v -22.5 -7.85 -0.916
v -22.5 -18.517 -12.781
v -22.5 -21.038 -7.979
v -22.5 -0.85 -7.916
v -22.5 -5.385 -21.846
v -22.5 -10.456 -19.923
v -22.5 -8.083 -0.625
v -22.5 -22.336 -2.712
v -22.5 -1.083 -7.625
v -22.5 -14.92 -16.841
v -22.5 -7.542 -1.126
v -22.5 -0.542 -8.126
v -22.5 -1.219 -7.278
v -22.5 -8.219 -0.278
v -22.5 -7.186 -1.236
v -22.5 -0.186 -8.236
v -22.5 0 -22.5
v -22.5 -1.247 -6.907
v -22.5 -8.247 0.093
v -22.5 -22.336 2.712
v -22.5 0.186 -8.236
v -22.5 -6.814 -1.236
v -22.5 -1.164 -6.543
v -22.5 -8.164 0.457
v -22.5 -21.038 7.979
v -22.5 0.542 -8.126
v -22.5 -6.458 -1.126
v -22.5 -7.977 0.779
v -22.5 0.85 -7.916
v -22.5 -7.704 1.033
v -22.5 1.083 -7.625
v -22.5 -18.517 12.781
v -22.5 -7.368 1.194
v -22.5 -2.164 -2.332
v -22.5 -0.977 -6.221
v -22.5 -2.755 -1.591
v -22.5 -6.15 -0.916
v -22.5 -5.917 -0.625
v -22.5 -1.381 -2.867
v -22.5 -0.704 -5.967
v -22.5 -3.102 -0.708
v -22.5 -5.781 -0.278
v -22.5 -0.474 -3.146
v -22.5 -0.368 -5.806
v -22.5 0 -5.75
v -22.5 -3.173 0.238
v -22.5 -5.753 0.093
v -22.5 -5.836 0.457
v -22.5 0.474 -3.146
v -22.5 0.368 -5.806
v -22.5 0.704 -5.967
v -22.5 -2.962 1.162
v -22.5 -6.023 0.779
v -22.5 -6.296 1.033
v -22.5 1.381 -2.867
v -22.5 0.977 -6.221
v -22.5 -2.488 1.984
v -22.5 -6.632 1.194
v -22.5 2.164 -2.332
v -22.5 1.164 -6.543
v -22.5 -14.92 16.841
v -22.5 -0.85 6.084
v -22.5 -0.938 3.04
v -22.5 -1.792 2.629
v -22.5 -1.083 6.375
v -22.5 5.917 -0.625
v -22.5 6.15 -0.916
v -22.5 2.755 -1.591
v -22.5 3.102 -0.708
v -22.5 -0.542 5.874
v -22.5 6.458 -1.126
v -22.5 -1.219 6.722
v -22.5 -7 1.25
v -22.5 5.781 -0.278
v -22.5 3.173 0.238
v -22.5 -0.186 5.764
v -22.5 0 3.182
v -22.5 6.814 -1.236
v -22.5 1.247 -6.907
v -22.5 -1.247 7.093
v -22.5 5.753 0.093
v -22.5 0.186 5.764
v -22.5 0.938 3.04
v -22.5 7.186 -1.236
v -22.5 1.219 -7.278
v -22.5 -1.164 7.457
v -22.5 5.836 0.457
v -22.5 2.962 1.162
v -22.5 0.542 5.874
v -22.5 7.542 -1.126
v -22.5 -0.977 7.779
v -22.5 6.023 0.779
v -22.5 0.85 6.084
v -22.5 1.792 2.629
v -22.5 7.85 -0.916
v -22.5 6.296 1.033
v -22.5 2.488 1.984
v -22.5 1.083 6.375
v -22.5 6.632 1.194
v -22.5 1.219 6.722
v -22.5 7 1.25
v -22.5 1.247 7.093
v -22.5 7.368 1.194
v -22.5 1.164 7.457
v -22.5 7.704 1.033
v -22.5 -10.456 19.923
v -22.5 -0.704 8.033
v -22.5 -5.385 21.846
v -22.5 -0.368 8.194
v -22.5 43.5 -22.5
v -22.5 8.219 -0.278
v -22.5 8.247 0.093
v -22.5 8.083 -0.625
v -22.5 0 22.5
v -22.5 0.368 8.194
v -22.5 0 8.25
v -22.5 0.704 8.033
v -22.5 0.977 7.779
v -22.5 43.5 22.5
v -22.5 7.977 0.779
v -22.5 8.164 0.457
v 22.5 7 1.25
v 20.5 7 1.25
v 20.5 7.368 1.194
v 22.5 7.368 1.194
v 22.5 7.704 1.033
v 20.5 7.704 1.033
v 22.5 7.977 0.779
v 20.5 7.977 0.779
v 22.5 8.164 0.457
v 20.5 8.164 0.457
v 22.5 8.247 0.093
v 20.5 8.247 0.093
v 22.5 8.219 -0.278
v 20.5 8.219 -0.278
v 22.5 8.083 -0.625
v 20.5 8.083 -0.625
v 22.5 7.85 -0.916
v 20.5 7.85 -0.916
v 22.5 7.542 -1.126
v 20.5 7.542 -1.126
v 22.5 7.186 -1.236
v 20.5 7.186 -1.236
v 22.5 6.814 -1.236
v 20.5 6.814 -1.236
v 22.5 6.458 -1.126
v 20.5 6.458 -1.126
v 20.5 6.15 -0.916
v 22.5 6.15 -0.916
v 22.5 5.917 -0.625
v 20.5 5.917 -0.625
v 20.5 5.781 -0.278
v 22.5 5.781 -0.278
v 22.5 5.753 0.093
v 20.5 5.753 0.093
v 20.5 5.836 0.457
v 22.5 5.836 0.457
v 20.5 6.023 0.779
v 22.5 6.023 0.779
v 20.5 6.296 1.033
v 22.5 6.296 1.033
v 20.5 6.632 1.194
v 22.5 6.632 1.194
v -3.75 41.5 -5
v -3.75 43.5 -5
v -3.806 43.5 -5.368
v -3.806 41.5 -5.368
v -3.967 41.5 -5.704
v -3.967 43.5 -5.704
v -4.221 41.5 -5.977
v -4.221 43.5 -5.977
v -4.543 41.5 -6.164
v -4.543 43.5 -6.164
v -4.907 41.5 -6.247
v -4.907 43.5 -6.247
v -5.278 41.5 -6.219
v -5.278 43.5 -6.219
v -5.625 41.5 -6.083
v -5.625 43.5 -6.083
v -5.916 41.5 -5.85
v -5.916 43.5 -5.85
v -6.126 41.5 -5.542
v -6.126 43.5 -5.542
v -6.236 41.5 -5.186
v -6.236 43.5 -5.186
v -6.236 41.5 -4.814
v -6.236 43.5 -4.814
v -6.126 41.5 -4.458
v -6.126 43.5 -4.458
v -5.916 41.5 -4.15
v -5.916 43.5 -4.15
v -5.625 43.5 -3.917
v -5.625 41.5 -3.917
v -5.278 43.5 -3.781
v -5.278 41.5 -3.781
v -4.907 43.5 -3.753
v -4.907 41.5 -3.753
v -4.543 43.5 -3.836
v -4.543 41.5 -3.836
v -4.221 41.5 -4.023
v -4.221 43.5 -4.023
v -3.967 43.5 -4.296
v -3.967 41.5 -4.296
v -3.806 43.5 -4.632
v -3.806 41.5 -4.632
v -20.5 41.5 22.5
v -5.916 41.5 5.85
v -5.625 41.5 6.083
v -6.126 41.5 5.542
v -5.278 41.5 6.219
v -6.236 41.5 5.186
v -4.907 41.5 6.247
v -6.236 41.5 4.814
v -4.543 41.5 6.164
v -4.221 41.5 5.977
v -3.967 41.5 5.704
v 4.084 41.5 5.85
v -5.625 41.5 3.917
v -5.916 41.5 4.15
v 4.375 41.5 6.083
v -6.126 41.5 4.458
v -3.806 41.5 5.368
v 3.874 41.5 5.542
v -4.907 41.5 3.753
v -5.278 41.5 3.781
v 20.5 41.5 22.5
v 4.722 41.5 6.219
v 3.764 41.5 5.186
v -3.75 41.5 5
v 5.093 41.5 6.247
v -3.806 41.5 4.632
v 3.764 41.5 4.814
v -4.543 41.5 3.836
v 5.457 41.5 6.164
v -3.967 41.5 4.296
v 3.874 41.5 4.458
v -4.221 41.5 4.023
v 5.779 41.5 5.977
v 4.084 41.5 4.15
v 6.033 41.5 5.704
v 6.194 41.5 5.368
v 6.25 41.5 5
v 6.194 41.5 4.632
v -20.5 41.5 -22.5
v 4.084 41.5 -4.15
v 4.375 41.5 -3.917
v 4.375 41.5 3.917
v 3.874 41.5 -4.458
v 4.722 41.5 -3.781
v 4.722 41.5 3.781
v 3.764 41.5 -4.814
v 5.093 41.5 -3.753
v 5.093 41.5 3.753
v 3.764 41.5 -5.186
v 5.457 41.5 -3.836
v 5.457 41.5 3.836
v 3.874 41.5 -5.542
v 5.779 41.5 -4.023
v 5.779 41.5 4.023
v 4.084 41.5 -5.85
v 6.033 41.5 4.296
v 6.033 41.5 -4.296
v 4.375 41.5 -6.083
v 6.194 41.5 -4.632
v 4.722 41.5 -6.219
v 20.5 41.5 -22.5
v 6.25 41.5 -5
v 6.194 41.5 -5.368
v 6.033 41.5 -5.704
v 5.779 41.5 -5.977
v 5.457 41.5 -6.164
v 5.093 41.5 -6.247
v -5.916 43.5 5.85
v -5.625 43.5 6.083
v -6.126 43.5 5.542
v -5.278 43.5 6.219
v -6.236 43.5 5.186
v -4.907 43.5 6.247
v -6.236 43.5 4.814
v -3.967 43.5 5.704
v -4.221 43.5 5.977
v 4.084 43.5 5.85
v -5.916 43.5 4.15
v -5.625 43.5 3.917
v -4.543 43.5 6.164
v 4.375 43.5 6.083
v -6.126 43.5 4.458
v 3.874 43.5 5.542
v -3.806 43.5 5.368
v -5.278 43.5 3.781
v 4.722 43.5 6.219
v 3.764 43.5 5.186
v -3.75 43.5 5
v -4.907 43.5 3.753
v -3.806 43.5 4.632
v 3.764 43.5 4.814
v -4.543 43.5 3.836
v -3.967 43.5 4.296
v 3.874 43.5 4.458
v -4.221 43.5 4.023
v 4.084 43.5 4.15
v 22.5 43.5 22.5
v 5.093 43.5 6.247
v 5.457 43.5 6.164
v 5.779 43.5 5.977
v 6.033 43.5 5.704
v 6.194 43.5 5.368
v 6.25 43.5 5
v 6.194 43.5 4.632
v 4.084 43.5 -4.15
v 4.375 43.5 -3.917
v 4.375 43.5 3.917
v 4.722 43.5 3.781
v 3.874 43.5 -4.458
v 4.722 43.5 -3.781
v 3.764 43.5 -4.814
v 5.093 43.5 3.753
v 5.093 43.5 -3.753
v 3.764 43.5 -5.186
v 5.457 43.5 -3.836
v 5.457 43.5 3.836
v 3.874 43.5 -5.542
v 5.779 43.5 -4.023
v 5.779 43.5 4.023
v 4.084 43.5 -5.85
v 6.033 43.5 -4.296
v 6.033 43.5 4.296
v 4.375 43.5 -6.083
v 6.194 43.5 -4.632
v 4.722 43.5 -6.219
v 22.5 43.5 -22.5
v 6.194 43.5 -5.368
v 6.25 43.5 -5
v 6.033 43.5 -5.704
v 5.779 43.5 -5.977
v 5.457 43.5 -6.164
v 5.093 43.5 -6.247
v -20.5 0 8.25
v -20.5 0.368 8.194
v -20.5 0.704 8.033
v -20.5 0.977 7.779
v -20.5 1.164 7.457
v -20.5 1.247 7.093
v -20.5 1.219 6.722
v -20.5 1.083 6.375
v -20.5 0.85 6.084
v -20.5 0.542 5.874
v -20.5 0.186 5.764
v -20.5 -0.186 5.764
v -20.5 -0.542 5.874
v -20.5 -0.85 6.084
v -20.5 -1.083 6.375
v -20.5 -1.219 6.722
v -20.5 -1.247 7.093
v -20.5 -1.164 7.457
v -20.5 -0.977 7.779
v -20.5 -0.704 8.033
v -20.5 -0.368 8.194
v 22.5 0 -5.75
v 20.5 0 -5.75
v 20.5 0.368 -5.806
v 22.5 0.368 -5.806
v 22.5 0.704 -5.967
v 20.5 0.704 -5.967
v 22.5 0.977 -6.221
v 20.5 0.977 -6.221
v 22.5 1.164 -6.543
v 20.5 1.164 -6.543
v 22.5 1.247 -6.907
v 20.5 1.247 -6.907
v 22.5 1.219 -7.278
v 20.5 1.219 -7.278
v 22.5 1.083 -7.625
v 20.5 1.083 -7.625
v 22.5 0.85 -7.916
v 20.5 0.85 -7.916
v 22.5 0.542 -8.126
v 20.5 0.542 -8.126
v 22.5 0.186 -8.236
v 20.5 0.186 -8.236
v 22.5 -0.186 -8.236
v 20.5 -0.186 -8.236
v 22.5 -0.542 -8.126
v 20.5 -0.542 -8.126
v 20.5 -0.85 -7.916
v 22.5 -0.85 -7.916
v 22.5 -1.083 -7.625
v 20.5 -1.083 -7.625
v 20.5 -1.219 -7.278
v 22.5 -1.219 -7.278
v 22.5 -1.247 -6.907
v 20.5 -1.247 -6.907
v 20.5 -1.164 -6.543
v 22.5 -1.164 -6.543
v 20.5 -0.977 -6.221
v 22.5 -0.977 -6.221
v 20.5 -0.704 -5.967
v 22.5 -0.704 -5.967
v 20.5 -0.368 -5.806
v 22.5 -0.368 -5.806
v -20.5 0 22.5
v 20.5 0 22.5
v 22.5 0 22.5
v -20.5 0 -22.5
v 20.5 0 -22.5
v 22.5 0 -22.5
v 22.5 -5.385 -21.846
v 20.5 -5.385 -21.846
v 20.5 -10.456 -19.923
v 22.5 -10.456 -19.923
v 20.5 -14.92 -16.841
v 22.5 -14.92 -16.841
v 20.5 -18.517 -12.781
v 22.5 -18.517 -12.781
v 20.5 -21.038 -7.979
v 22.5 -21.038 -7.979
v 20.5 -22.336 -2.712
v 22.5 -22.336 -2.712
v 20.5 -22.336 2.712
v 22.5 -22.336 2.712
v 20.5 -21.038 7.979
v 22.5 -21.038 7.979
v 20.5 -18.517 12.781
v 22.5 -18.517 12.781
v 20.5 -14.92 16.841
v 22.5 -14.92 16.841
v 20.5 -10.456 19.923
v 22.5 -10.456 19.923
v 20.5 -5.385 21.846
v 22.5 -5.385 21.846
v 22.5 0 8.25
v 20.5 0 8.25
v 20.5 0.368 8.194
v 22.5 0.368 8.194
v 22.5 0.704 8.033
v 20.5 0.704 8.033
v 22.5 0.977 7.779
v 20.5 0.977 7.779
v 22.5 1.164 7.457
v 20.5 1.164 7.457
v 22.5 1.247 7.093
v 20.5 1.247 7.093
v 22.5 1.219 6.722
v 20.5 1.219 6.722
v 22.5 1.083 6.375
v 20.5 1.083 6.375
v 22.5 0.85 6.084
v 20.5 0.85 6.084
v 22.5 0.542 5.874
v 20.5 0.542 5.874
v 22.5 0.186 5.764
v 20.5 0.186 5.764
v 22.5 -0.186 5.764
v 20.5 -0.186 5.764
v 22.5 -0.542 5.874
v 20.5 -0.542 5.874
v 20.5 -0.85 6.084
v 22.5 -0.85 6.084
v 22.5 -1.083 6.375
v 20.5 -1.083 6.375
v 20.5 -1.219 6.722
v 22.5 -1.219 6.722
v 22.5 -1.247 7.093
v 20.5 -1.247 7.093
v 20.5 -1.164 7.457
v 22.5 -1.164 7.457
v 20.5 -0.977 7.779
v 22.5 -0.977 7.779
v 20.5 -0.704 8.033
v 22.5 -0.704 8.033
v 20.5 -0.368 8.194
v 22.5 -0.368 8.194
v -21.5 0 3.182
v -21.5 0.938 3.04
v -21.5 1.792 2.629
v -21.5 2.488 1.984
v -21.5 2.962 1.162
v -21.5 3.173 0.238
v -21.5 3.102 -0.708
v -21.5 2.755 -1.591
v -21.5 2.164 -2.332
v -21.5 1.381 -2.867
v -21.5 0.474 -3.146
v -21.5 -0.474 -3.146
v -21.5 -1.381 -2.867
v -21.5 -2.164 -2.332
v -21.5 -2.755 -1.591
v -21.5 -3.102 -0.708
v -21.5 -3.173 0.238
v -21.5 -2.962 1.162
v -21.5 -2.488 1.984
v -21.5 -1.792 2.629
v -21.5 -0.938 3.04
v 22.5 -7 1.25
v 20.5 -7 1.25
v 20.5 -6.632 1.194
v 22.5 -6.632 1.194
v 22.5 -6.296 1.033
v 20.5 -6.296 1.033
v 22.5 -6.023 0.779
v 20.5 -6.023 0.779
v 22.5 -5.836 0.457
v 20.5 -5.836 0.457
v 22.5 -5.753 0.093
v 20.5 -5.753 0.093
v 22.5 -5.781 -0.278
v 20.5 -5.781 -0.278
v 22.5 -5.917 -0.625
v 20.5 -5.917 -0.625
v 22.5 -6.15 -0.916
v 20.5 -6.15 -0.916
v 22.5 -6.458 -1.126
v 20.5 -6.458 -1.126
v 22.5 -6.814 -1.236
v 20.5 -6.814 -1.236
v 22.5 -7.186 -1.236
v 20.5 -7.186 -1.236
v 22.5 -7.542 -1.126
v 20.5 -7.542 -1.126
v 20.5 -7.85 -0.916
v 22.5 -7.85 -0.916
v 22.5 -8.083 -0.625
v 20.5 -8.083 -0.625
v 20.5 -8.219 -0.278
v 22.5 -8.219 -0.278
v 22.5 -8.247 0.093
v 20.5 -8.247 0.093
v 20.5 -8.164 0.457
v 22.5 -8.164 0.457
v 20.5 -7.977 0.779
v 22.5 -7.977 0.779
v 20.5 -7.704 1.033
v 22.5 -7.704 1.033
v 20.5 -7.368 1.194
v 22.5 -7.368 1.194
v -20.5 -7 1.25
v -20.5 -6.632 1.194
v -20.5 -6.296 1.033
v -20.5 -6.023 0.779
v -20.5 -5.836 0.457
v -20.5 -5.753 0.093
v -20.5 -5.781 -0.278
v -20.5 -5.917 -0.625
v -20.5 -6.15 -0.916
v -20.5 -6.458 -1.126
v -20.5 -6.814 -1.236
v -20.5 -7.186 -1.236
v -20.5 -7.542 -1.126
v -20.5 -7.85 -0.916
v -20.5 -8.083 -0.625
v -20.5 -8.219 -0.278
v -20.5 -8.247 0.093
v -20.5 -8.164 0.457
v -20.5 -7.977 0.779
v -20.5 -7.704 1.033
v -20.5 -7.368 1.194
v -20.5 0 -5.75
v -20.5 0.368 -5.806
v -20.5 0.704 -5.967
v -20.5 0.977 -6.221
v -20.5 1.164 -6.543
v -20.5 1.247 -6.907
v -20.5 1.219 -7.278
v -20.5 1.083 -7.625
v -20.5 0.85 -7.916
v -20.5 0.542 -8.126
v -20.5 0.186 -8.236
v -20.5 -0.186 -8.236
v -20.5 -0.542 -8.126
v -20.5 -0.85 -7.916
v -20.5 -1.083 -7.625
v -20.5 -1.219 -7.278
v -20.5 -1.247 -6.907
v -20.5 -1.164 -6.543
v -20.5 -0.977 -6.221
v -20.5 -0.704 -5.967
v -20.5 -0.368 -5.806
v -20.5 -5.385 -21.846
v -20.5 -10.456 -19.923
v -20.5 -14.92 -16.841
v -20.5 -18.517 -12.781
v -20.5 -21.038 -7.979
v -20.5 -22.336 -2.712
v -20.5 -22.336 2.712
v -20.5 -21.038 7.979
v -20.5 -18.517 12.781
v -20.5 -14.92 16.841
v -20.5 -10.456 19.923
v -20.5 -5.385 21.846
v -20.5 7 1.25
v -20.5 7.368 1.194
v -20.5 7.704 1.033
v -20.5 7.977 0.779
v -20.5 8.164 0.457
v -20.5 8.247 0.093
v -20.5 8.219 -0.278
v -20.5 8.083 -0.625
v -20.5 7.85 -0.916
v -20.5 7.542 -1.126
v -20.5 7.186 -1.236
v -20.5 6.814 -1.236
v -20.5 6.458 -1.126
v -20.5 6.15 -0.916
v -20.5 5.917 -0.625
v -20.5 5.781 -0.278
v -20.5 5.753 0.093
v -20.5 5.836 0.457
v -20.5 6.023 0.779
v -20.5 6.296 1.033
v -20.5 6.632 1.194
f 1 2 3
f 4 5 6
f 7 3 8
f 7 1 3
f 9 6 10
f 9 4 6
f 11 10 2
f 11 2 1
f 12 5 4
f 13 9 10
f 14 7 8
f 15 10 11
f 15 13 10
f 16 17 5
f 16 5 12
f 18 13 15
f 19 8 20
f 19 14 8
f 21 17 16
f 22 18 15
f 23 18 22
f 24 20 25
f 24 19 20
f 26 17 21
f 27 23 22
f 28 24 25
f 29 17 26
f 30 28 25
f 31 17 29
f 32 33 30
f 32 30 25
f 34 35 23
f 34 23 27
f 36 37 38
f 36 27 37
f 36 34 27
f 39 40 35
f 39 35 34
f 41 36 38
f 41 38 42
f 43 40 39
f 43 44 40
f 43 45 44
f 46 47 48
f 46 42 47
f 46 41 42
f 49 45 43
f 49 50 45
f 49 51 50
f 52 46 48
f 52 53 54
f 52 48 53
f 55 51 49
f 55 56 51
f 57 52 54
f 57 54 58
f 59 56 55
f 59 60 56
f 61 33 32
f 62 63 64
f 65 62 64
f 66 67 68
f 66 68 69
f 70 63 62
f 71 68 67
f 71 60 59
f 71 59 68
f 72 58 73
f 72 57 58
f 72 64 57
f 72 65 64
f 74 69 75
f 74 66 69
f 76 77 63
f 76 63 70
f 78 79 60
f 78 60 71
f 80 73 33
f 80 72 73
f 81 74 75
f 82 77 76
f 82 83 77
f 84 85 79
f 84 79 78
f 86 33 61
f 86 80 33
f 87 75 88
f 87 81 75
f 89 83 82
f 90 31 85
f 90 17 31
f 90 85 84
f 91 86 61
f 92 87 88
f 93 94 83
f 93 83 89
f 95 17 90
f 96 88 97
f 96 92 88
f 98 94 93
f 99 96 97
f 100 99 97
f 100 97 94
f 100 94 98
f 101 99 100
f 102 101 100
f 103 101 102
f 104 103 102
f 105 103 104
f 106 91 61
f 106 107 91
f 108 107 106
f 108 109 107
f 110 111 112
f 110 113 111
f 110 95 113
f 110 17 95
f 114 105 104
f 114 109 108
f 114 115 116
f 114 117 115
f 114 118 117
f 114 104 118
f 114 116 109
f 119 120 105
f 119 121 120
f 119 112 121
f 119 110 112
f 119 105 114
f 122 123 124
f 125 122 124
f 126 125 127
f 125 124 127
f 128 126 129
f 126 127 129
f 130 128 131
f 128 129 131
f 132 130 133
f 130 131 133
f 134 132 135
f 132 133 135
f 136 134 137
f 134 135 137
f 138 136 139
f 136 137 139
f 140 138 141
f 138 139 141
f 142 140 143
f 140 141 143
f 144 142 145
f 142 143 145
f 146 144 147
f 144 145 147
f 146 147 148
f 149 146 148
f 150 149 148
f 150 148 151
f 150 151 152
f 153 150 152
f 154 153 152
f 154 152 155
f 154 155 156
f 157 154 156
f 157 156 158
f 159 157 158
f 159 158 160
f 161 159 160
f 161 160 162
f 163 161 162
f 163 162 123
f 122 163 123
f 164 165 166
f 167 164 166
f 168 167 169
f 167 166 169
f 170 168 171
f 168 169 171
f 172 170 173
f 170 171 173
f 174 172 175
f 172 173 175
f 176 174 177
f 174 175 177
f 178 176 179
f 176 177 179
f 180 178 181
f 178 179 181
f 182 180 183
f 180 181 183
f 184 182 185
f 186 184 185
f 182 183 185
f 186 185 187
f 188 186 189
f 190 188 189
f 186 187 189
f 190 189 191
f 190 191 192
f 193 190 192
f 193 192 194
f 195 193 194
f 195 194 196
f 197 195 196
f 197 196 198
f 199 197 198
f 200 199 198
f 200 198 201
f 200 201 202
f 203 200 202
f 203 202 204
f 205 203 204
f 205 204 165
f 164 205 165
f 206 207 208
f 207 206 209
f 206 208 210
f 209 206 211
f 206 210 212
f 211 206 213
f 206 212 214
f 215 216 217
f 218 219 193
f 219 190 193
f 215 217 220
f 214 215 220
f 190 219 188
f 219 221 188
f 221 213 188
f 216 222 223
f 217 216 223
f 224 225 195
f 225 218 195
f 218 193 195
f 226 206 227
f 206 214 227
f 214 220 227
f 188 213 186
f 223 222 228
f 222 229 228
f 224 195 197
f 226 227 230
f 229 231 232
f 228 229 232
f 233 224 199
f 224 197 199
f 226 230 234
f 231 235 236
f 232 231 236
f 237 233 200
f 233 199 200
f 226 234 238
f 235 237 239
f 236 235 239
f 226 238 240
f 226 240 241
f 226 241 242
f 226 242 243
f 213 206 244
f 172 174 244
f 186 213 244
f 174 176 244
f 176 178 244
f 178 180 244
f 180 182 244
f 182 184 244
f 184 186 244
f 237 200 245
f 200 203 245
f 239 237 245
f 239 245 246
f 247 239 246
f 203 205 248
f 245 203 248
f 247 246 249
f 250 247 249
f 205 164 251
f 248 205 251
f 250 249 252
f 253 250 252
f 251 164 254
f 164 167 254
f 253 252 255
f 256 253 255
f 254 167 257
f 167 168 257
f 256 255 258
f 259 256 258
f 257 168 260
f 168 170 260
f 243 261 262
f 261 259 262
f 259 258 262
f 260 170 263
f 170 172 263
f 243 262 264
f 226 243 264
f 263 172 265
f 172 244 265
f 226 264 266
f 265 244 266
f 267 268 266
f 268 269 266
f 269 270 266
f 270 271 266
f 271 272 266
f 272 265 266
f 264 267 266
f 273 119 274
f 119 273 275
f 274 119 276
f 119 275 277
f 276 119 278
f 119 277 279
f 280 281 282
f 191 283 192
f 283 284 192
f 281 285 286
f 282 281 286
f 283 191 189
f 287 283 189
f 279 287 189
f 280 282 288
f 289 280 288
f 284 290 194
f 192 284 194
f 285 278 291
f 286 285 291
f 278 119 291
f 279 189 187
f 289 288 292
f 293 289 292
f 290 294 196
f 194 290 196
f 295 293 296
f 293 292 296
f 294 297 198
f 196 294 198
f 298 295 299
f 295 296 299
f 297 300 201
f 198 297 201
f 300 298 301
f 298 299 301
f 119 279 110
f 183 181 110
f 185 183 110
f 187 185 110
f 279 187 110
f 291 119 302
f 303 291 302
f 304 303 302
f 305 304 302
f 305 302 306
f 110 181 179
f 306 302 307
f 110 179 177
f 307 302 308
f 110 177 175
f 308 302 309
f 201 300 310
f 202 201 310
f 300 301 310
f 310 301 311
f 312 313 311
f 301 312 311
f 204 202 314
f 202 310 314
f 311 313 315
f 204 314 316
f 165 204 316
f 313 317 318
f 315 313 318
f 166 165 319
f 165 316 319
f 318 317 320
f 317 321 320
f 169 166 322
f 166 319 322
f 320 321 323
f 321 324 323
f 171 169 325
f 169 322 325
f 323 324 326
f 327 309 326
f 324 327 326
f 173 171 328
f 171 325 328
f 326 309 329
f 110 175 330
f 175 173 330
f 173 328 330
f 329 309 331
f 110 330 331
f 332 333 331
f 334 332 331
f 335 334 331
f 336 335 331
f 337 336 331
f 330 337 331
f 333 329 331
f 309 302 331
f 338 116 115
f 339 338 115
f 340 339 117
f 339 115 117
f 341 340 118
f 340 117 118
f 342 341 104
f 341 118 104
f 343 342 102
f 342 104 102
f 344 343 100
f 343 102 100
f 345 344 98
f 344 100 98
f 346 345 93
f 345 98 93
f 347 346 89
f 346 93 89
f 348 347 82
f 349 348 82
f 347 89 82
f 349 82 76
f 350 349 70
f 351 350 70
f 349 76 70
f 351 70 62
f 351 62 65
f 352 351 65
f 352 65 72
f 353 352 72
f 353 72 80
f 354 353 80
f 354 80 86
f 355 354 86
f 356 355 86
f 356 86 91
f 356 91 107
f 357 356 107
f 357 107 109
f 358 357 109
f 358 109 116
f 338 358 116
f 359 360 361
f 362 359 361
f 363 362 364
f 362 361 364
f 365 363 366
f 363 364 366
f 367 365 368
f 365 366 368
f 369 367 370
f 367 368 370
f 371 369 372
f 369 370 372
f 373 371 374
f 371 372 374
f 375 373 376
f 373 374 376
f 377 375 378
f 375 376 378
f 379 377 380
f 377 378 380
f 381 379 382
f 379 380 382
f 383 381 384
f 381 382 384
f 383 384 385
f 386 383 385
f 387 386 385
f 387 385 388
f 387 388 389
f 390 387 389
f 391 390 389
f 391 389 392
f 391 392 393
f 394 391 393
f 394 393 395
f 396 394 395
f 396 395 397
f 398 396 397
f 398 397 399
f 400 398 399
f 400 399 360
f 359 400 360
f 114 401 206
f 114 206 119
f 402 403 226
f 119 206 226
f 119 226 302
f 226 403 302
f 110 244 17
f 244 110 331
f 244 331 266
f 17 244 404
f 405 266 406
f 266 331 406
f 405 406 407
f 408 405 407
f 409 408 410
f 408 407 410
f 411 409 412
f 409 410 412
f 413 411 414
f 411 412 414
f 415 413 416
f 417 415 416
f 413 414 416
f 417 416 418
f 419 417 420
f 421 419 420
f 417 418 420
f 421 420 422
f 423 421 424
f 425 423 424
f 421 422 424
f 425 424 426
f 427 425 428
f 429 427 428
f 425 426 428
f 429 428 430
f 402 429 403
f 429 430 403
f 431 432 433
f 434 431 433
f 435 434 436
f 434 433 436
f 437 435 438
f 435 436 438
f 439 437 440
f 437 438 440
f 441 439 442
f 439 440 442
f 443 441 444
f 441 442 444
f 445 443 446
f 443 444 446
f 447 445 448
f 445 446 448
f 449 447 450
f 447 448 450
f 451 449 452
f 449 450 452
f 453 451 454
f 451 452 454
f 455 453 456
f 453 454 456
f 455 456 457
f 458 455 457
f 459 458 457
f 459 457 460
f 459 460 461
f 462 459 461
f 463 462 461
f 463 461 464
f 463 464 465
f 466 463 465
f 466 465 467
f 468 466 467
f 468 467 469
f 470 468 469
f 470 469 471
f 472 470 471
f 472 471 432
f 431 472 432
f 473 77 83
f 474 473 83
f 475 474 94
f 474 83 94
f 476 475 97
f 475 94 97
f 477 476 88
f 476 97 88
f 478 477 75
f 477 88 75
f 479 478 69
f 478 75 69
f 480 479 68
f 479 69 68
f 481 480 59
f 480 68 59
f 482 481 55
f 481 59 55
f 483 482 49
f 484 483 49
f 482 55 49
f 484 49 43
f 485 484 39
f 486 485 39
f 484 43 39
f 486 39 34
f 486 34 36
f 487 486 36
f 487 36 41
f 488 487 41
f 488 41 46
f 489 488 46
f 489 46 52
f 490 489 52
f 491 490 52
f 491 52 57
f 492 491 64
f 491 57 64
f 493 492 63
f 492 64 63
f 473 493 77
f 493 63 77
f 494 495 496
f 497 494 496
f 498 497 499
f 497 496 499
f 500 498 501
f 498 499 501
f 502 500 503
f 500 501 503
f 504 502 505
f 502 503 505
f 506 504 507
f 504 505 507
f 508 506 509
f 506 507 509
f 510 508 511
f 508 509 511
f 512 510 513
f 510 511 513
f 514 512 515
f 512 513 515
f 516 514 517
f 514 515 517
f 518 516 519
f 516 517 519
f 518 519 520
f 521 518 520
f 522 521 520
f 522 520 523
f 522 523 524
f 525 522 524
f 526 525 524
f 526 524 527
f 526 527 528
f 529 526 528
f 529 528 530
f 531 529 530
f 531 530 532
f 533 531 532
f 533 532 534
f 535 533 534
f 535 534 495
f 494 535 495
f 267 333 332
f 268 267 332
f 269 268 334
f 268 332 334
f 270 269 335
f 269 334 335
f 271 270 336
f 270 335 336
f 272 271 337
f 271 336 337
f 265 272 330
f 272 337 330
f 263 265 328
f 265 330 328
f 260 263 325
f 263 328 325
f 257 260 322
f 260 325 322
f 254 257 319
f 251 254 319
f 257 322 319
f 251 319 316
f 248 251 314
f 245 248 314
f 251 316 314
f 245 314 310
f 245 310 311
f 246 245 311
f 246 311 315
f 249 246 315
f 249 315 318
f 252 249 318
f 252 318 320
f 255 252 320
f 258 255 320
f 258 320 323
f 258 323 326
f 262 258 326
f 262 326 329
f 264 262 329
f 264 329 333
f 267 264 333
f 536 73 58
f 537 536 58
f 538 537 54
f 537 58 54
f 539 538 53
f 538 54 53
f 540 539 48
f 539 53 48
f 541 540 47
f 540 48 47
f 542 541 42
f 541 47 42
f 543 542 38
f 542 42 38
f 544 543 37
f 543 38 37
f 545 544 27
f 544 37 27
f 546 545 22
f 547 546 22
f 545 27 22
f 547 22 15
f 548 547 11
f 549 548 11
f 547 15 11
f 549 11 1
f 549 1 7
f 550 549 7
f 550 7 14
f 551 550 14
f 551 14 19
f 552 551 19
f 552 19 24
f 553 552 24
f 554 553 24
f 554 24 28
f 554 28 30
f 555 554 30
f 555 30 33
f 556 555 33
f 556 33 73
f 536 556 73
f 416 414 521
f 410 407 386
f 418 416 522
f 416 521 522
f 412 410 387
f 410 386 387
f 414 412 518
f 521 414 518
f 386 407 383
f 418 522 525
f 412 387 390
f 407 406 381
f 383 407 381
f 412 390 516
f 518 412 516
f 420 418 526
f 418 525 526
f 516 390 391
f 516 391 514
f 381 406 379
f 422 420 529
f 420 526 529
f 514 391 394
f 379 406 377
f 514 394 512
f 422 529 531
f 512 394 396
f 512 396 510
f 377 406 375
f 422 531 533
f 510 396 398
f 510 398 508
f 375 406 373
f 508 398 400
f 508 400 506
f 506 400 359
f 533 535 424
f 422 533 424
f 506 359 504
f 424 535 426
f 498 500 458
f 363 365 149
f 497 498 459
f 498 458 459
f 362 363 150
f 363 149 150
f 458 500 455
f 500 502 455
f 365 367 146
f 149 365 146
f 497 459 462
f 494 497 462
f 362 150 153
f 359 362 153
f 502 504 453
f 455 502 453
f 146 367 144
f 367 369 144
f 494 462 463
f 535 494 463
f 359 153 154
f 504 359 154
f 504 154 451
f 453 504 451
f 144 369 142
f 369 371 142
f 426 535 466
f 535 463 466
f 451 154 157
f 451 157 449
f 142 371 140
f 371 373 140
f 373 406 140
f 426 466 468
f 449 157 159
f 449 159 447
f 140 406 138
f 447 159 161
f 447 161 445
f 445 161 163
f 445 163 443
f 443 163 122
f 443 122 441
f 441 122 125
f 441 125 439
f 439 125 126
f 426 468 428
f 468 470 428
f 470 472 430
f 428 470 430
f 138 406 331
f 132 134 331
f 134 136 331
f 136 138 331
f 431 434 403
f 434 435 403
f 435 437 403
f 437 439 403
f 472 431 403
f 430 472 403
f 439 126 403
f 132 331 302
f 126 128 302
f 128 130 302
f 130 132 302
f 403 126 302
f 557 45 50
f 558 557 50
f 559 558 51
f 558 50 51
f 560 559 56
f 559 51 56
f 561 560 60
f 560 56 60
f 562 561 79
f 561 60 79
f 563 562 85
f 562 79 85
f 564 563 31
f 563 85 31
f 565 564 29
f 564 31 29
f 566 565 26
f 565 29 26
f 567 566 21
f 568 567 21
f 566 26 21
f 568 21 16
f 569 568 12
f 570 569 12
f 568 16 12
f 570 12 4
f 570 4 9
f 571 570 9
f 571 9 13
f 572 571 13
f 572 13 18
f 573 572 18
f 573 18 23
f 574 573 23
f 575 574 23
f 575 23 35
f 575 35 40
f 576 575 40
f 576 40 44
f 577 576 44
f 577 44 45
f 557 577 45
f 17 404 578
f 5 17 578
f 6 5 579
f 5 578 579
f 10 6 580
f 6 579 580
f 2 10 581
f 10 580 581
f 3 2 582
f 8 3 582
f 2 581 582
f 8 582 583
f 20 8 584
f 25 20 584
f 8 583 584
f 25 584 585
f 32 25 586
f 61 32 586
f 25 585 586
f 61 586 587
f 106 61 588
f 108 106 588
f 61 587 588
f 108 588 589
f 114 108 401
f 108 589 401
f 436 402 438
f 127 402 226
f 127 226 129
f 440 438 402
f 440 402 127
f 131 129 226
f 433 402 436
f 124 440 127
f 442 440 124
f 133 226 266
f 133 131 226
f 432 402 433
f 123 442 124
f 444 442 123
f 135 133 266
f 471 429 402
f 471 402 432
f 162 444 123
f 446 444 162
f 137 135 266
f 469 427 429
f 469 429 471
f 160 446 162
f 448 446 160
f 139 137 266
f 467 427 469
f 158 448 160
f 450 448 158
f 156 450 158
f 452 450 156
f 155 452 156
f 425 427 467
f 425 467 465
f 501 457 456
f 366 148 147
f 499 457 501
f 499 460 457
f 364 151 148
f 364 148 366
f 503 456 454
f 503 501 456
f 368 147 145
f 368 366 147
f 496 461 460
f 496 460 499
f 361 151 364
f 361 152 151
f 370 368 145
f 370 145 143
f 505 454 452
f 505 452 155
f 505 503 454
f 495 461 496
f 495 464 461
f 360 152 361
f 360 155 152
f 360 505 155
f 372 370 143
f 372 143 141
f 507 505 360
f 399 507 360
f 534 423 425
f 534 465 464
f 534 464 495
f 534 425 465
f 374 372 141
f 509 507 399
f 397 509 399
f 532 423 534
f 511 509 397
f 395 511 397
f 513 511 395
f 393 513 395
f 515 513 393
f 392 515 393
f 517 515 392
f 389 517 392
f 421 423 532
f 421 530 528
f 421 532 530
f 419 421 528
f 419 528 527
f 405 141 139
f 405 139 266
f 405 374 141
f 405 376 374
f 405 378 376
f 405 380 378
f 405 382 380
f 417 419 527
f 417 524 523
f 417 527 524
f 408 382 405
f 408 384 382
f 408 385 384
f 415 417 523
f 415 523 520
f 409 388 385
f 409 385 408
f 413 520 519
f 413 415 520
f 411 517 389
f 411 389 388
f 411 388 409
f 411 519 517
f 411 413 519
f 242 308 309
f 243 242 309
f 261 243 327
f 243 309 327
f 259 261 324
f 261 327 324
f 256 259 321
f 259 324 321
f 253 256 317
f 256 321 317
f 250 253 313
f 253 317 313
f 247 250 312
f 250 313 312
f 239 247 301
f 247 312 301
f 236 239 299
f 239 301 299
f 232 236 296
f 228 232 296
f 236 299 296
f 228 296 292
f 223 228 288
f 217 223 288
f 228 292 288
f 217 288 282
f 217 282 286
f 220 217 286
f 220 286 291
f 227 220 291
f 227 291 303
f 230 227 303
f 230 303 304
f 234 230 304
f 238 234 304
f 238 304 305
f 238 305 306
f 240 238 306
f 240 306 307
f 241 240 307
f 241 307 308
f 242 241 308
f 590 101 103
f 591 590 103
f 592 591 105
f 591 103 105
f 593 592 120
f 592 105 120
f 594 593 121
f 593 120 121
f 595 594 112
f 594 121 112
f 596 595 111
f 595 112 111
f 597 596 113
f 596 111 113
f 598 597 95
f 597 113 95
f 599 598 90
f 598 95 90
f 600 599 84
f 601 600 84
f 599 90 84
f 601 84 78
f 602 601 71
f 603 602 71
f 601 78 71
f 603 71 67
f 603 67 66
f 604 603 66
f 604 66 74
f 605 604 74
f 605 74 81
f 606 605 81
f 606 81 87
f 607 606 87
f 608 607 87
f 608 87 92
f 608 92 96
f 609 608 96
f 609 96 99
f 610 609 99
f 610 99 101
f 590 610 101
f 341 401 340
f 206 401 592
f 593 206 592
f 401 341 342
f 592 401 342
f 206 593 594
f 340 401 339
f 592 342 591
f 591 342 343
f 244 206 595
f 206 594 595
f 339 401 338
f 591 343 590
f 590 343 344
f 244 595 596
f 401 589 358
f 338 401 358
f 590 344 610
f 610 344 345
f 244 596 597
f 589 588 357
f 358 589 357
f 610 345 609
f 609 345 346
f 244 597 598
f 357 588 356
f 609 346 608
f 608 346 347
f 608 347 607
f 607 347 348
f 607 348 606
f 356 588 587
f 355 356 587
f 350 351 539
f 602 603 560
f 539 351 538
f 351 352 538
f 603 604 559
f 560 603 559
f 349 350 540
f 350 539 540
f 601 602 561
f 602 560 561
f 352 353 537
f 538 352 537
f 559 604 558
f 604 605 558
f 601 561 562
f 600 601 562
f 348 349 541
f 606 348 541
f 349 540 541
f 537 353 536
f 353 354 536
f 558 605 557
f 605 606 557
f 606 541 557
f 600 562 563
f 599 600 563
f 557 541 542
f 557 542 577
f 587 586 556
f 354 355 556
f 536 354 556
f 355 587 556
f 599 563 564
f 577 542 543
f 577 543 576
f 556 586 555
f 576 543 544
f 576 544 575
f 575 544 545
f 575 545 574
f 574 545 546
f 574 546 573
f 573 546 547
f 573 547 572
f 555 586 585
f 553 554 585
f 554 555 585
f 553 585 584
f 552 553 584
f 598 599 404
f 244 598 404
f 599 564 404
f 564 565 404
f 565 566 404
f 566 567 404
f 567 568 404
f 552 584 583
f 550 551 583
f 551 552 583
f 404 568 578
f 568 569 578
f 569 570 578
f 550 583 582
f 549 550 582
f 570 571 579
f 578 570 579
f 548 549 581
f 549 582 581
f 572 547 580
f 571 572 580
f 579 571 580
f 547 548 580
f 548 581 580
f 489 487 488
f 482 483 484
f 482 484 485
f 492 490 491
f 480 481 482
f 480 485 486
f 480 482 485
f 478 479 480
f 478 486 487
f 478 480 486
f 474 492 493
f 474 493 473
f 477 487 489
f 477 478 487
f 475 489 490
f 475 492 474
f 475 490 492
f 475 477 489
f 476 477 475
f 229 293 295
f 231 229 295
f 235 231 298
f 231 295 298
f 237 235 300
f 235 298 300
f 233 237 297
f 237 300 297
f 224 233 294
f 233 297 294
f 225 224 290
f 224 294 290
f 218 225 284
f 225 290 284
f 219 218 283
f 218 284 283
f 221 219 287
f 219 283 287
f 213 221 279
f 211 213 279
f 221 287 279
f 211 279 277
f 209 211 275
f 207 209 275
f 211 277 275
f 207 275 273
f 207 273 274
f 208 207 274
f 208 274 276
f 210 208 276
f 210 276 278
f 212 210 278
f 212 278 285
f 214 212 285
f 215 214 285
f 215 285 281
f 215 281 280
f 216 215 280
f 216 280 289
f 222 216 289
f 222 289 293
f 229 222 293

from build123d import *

# Parameters (mm, degrees)
BOSS_EXTRUDE2_DEPTH      = 22.5
BOSS_EXTRUDE2_DEPTH_BACK = 22.5
CUT_EXTRUDE4_DEPTH       = 41.5
CUT_EXTRUDE4_DEPTH_BACK  = 22.5
SKETCH7_W                = 41
SKETCH7_H                = 45
SKETCH8_R                = 1.25
CUT_EXTRUDE5_DEPTH       = 18.5
SKETCH9_R                = 1.25
CUT_EXTRUDE6_DEPTH       = 58.5
SKETCH10_R               = 3.181768177
CUT_EXTRUDE7_DEPTH       = 1


with BuildPart() as part:
    # Sketch6 → Boss-Extrude2 (new, two sides: drawn at the far end of the back side and taken through both)
    with BuildSketch(Plane(origin=(0, 0, 0), x_dir=(0, 0, -1), z_dir=(1, 0, 0)).offset(-BOSS_EXTRUDE2_DEPTH_BACK)):
        with BuildLine():
            Line((-22.5, 0), (-22.5, 43.5))
            Line((-22.5, 43.5), (22.5, 43.5))
            Line((22.5, 43.5), (22.5, 0))
            ThreePointArc((22.5, 0), (0, -22.5), (-22.5, 0))
        make_face()
    extrude(amount=BOSS_EXTRUDE2_DEPTH + BOSS_EXTRUDE2_DEPTH_BACK)

    # Sketch7 → Cut-Extrude4 (cut, two sides: drawn at the far end of the back side and taken through both)
    with BuildSketch(Plane(origin=(0, 0, 0), x_dir=(1, 0, 0), z_dir=(0, 1, 0)).offset(-CUT_EXTRUDE4_DEPTH_BACK)):
        Rectangle(SKETCH7_W, SKETCH7_H)
    extrude(amount=CUT_EXTRUDE4_DEPTH + CUT_EXTRUDE4_DEPTH_BACK, mode=Mode.SUBTRACT)

    # Sketch8 → Cut-Extrude5 (cut)
    with BuildSketch(Plane(origin=(0, 43.5, 0), x_dir=(1, 0, 0), z_dir=(0, 1, 0))):
        with Locations((-5, 5)):
            Circle(SKETCH8_R)
        with Locations((5, -5)):
            Circle(SKETCH8_R)
        with Locations((5, 5)):
            Circle(SKETCH8_R)
        with Locations((-5, -5)):
            Circle(SKETCH8_R)
    extrude(amount=-CUT_EXTRUDE5_DEPTH, mode=Mode.SUBTRACT)

    # Sketch9 → Cut-Extrude6 (cut)
    with BuildSketch(Plane.ZY.offset(22.5)):
        with Locations((0, 7)):
            Circle(SKETCH9_R)
        with Locations((0, -7)):
            Circle(SKETCH9_R)
        with Locations((-7, 0)):
            Circle(SKETCH9_R)
        with Locations((7, 0)):
            Circle(SKETCH9_R)
    extrude(amount=-CUT_EXTRUDE6_DEPTH, mode=Mode.SUBTRACT)

    # Sketch10 → Cut-Extrude7 (cut)
    with BuildSketch(Plane.ZY.offset(22.5)):
        Circle(SKETCH10_R)
    extrude(amount=-CUT_EXTRUDE7_DEPTH, mode=Mode.SUBTRACT)


solid = part.part
